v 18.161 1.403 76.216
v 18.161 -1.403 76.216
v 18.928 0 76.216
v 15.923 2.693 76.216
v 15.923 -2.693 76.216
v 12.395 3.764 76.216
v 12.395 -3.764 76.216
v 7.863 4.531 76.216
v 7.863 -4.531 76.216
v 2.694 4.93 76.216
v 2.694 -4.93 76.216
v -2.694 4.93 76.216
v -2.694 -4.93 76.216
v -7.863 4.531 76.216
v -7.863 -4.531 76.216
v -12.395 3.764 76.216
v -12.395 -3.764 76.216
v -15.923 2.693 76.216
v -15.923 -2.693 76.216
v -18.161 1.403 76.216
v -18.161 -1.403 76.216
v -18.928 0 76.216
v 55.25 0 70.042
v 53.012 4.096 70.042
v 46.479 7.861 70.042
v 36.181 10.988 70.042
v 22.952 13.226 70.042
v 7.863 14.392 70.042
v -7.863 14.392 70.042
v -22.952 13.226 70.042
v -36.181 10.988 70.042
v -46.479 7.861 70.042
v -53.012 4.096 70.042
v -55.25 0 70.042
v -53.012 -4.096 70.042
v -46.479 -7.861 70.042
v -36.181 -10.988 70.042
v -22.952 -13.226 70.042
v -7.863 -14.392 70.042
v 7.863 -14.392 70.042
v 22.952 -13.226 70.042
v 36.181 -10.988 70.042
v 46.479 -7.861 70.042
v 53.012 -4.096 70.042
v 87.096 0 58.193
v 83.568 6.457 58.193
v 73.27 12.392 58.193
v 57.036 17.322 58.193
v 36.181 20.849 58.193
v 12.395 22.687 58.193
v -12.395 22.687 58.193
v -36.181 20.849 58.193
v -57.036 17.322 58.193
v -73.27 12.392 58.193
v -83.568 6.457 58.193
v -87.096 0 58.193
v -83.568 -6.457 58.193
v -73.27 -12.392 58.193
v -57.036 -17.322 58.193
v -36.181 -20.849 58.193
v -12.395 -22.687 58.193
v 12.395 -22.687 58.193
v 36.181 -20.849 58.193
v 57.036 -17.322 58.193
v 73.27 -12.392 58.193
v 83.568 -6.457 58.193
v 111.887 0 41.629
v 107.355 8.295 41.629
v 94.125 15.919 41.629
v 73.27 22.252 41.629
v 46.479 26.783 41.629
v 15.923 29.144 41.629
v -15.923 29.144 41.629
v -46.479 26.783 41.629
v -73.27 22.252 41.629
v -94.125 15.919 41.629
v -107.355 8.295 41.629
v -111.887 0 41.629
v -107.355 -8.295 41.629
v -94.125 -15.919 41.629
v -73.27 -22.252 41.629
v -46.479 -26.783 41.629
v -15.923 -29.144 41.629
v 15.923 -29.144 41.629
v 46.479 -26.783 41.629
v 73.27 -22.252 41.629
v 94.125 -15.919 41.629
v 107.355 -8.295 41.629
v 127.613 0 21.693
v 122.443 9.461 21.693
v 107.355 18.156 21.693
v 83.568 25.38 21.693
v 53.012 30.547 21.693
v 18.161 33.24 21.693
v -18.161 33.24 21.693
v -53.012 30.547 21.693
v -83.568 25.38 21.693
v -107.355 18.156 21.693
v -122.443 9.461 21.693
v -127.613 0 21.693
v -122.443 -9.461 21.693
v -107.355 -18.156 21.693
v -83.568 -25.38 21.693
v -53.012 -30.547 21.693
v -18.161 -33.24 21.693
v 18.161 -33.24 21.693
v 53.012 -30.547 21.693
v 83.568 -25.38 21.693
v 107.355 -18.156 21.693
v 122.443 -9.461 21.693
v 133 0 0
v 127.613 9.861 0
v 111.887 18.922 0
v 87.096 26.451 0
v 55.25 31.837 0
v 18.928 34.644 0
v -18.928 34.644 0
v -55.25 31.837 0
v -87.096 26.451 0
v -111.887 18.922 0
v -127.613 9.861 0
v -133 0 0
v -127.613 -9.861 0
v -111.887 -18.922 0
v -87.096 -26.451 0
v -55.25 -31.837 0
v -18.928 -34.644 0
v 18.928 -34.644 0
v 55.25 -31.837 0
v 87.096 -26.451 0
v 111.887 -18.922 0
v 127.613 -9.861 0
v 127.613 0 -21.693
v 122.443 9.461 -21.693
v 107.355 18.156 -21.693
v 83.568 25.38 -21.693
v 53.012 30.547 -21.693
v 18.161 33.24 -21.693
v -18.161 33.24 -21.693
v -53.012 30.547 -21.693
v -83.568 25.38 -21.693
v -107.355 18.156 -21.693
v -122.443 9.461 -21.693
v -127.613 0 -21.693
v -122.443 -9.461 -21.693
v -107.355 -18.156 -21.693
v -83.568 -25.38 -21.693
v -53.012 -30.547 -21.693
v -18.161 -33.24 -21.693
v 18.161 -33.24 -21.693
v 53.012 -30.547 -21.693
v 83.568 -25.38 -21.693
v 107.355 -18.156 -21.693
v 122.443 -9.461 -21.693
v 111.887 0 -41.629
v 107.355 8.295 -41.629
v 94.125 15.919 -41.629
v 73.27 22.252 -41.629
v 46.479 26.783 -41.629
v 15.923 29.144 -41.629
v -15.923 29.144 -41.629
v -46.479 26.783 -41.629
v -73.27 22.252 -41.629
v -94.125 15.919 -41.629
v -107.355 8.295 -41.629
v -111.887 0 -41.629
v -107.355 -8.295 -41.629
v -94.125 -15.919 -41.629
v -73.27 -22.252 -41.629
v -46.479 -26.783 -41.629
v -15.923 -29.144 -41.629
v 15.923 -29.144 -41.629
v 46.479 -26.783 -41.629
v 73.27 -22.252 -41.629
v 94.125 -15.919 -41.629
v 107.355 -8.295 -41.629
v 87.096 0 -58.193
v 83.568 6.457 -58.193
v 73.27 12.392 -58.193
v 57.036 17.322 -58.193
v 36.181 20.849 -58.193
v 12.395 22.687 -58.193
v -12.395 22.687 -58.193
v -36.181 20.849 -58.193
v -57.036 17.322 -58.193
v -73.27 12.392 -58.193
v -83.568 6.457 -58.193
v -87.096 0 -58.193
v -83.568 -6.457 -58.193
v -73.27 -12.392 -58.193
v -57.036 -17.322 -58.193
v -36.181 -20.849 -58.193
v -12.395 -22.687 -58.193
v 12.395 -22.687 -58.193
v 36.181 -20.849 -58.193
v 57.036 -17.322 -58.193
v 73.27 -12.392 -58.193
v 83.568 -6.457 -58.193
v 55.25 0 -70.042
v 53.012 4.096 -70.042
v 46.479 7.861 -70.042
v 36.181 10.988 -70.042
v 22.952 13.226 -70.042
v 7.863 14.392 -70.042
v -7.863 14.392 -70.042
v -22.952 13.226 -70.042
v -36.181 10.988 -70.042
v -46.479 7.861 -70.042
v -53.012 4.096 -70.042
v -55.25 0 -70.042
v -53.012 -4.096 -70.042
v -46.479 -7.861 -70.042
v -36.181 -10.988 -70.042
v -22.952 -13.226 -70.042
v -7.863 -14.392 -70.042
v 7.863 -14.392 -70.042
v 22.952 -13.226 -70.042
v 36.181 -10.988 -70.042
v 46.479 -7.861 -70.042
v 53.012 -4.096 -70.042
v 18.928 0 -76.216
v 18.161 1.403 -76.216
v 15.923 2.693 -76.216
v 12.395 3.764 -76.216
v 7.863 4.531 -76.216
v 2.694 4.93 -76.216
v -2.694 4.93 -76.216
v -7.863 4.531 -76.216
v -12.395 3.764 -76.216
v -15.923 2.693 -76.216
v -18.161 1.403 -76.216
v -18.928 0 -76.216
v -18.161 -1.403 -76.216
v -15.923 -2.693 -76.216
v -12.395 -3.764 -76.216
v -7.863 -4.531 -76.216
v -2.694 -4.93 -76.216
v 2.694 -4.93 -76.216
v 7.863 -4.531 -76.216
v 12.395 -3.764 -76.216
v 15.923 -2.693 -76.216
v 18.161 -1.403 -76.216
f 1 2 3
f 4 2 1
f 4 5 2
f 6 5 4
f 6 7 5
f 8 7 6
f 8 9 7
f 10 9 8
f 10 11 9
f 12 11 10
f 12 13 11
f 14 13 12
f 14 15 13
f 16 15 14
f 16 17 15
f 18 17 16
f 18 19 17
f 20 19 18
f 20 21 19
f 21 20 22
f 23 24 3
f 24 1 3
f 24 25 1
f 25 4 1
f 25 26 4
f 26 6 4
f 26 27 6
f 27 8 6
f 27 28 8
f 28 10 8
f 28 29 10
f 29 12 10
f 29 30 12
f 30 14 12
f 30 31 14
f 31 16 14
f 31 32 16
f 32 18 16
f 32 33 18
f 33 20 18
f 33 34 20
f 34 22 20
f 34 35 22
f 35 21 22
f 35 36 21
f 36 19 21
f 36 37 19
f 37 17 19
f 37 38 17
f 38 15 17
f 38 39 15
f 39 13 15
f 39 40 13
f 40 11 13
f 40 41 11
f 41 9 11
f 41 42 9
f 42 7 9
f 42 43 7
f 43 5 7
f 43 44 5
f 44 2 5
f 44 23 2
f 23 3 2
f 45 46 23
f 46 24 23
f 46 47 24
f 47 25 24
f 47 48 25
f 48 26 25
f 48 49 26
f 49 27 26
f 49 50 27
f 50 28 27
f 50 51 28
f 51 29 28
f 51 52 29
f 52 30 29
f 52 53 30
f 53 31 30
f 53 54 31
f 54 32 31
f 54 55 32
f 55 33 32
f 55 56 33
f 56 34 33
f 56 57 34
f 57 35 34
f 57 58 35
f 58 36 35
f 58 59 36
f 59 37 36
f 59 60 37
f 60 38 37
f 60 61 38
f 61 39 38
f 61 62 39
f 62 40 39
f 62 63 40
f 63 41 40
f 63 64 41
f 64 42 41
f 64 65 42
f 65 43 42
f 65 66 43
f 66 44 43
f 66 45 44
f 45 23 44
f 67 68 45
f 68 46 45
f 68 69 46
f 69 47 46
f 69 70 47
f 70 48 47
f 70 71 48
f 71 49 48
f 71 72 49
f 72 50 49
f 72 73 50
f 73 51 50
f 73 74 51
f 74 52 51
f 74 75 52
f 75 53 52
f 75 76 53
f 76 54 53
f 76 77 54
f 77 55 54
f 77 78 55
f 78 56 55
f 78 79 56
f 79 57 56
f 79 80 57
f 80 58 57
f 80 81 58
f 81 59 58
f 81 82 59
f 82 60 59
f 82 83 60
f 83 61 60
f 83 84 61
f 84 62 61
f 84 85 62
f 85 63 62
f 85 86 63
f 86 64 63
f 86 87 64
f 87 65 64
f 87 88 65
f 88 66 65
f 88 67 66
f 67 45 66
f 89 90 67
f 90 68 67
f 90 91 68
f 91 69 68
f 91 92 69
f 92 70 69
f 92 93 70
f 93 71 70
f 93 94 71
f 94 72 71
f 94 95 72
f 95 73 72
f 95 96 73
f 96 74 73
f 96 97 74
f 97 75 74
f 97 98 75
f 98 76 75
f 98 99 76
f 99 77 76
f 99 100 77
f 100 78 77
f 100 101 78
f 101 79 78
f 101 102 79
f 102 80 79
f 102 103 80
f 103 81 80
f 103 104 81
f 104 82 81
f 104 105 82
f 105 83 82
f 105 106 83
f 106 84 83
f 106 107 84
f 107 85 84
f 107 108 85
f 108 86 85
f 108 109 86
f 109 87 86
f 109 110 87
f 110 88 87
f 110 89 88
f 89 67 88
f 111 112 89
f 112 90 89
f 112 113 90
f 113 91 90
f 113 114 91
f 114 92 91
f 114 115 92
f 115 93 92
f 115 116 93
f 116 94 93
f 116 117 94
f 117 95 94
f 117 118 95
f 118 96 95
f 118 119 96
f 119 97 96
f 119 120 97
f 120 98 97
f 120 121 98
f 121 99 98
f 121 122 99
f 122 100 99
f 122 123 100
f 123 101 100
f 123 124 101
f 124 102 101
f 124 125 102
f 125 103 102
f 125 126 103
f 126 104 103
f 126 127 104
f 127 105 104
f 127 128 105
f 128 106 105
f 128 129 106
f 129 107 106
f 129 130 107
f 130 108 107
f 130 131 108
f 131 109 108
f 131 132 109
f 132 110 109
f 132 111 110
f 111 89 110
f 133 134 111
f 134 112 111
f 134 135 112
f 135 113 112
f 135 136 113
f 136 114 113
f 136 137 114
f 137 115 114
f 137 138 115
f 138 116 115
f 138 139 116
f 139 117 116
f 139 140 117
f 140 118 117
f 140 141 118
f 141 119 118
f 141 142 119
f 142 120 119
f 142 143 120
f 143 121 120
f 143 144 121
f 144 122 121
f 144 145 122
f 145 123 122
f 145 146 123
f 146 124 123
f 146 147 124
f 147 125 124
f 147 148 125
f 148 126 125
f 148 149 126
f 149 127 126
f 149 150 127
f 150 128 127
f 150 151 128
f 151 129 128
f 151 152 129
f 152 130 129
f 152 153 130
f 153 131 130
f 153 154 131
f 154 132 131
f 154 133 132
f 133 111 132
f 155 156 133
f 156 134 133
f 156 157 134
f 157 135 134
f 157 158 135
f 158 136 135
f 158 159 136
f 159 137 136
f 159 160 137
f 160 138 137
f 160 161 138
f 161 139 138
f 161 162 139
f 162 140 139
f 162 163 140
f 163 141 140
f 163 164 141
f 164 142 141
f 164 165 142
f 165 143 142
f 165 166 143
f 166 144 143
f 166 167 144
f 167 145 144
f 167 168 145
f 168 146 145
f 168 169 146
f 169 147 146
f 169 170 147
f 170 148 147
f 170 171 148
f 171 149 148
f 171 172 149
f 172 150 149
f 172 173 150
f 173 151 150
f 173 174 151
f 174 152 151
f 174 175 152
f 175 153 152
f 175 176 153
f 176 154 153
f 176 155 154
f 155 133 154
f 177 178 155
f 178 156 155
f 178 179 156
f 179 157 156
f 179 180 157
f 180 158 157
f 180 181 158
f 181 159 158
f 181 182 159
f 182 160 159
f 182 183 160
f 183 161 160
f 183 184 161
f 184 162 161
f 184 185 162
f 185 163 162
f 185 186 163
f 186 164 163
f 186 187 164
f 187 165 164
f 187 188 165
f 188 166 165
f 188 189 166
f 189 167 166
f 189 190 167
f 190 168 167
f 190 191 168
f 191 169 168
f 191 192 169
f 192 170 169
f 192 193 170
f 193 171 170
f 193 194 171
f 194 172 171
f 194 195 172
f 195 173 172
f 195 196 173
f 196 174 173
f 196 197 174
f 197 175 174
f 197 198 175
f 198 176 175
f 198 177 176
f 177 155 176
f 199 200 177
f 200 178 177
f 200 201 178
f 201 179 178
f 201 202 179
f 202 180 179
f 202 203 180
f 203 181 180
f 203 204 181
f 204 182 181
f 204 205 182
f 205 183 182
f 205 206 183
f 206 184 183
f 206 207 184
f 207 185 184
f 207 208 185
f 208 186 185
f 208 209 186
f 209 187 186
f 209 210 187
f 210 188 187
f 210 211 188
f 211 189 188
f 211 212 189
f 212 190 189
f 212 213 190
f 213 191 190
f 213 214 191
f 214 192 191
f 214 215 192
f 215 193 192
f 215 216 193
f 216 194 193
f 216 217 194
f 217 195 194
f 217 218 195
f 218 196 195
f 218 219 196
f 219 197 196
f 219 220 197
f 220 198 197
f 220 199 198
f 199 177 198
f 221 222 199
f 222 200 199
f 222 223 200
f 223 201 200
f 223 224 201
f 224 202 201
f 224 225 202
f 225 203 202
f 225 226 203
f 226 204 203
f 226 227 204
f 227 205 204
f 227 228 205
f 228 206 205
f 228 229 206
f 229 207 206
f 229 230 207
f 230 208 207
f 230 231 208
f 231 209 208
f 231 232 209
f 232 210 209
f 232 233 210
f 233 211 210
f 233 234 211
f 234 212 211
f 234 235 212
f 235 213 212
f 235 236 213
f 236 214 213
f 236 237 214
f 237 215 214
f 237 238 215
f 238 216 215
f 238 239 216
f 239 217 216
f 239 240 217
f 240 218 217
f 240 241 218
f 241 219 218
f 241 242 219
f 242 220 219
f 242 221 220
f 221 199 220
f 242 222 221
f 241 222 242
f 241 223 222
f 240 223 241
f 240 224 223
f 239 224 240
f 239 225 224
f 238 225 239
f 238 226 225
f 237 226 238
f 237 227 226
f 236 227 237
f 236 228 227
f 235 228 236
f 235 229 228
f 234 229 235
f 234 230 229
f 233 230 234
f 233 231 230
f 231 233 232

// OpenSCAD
// Generated by SolidPython 1.0.1 on 2020-07-29 00:46:53


scale(v = [19, 5, 11]) {
	sphere(r = 7);
}
/***********************************************
*********      SolidPython code:      **********
************************************************
 
# import packages: SolidPython
from solid import *
from solid.utils import *
from itertools import chain, combinations, permutations


class Resize:

    def __init__(self, scad_file):
        self.scad_file = scad_file
        #self.scad_file = import_scad(scad_file)
        # cone/cylinder param:
        self.r1 = 0
        self.r2 = 0
        self.h = 0
        # rectangular prism param:
        self.w = 0
        self.l = 0
        # ellipse param:
        self.r = 0

    # import OpenScad code (file name corresponds to shape)


    # classify shape + parameters
    def assign(self, param1, param2, param3):
        if self.scad_file == 'cone.scad':
            self.r1 = param1
            self.r2 = param2
            self.h = param3
        elif self.scad_file == 'cylinder.scad':
            self.r1 = param1
            self.r2 = param2
            self.h = param3
        elif self.scad_file == 'rectangularPrism.scad':
            self.h = param1
            self.l = param2
            self.w = param3
        else:
            self.r = param1
            self.h = param2

    # resize parameters
    def iterate(self):
        x = range(3, 20, 2)
        i = 1
        if self.scad_file == 'cone.scad':
            tempList = list(permutations(x, 2))
            for temp in tempList:
                param1 = temp[0]
                param2 = temp[1]
                filepath = 'produced_scad_files/' + 'cone' + str(param1) + '_' + str(param2) + '_' + '.scad'
                scad_render_to_file(cylinder(h=param1, r1=param2, r2=0), filepath)

        elif self.scad_file == 'cylinder.scad':
            tempList = list(permutations(x, 3))
            for temp in tempList:
                param1 = temp[0]
                param2 = temp[1]
                filepath = 'produced_scad_files/' + 'cylinder' + str(param1) + '_' + str(param2) + '_' + '.scad'
                scad_render_to_file(cylinder(h=param1, r1=param2, r2=param2), filepath)

        elif self.scad_file == 'rectangularPrism.scad':
            tempList = list(permutations(x, 3))
            for temp in tempList:
                param1 = temp[0]
                param2 = temp[1]
                param3 = temp[2]
                filepath = 'produced_scad_files/' + 'rectangularPrism' + str(param1) + '_' + str(param2) + '_' + str(
                    param3) + '.scad'
                scad_render_to_file(cube(size=(param1, param2, param3)), filepath)

        elif self.scad_file == 'ellipse.scad':
            tempList = list(permutations(x, 4))
            for temp in tempList:
                param1 = temp[0]
                param2 = temp[1]
                param3 = temp[2]
                param4 = temp[3]
                filepath = 'produced_scad_files/' + 'ellipse' + str(param1) + '_' + str(param2) + '_' + str(param3) + '_' + str(param4) + '.scad'
                scad_render_to_file(scale([param1, param2, param3])(sphere(r=param4)), filepath)

    def render_to_scadfile(self):
        scad_render_to_file(scad, 'example.scad') 
 
************************************************/
